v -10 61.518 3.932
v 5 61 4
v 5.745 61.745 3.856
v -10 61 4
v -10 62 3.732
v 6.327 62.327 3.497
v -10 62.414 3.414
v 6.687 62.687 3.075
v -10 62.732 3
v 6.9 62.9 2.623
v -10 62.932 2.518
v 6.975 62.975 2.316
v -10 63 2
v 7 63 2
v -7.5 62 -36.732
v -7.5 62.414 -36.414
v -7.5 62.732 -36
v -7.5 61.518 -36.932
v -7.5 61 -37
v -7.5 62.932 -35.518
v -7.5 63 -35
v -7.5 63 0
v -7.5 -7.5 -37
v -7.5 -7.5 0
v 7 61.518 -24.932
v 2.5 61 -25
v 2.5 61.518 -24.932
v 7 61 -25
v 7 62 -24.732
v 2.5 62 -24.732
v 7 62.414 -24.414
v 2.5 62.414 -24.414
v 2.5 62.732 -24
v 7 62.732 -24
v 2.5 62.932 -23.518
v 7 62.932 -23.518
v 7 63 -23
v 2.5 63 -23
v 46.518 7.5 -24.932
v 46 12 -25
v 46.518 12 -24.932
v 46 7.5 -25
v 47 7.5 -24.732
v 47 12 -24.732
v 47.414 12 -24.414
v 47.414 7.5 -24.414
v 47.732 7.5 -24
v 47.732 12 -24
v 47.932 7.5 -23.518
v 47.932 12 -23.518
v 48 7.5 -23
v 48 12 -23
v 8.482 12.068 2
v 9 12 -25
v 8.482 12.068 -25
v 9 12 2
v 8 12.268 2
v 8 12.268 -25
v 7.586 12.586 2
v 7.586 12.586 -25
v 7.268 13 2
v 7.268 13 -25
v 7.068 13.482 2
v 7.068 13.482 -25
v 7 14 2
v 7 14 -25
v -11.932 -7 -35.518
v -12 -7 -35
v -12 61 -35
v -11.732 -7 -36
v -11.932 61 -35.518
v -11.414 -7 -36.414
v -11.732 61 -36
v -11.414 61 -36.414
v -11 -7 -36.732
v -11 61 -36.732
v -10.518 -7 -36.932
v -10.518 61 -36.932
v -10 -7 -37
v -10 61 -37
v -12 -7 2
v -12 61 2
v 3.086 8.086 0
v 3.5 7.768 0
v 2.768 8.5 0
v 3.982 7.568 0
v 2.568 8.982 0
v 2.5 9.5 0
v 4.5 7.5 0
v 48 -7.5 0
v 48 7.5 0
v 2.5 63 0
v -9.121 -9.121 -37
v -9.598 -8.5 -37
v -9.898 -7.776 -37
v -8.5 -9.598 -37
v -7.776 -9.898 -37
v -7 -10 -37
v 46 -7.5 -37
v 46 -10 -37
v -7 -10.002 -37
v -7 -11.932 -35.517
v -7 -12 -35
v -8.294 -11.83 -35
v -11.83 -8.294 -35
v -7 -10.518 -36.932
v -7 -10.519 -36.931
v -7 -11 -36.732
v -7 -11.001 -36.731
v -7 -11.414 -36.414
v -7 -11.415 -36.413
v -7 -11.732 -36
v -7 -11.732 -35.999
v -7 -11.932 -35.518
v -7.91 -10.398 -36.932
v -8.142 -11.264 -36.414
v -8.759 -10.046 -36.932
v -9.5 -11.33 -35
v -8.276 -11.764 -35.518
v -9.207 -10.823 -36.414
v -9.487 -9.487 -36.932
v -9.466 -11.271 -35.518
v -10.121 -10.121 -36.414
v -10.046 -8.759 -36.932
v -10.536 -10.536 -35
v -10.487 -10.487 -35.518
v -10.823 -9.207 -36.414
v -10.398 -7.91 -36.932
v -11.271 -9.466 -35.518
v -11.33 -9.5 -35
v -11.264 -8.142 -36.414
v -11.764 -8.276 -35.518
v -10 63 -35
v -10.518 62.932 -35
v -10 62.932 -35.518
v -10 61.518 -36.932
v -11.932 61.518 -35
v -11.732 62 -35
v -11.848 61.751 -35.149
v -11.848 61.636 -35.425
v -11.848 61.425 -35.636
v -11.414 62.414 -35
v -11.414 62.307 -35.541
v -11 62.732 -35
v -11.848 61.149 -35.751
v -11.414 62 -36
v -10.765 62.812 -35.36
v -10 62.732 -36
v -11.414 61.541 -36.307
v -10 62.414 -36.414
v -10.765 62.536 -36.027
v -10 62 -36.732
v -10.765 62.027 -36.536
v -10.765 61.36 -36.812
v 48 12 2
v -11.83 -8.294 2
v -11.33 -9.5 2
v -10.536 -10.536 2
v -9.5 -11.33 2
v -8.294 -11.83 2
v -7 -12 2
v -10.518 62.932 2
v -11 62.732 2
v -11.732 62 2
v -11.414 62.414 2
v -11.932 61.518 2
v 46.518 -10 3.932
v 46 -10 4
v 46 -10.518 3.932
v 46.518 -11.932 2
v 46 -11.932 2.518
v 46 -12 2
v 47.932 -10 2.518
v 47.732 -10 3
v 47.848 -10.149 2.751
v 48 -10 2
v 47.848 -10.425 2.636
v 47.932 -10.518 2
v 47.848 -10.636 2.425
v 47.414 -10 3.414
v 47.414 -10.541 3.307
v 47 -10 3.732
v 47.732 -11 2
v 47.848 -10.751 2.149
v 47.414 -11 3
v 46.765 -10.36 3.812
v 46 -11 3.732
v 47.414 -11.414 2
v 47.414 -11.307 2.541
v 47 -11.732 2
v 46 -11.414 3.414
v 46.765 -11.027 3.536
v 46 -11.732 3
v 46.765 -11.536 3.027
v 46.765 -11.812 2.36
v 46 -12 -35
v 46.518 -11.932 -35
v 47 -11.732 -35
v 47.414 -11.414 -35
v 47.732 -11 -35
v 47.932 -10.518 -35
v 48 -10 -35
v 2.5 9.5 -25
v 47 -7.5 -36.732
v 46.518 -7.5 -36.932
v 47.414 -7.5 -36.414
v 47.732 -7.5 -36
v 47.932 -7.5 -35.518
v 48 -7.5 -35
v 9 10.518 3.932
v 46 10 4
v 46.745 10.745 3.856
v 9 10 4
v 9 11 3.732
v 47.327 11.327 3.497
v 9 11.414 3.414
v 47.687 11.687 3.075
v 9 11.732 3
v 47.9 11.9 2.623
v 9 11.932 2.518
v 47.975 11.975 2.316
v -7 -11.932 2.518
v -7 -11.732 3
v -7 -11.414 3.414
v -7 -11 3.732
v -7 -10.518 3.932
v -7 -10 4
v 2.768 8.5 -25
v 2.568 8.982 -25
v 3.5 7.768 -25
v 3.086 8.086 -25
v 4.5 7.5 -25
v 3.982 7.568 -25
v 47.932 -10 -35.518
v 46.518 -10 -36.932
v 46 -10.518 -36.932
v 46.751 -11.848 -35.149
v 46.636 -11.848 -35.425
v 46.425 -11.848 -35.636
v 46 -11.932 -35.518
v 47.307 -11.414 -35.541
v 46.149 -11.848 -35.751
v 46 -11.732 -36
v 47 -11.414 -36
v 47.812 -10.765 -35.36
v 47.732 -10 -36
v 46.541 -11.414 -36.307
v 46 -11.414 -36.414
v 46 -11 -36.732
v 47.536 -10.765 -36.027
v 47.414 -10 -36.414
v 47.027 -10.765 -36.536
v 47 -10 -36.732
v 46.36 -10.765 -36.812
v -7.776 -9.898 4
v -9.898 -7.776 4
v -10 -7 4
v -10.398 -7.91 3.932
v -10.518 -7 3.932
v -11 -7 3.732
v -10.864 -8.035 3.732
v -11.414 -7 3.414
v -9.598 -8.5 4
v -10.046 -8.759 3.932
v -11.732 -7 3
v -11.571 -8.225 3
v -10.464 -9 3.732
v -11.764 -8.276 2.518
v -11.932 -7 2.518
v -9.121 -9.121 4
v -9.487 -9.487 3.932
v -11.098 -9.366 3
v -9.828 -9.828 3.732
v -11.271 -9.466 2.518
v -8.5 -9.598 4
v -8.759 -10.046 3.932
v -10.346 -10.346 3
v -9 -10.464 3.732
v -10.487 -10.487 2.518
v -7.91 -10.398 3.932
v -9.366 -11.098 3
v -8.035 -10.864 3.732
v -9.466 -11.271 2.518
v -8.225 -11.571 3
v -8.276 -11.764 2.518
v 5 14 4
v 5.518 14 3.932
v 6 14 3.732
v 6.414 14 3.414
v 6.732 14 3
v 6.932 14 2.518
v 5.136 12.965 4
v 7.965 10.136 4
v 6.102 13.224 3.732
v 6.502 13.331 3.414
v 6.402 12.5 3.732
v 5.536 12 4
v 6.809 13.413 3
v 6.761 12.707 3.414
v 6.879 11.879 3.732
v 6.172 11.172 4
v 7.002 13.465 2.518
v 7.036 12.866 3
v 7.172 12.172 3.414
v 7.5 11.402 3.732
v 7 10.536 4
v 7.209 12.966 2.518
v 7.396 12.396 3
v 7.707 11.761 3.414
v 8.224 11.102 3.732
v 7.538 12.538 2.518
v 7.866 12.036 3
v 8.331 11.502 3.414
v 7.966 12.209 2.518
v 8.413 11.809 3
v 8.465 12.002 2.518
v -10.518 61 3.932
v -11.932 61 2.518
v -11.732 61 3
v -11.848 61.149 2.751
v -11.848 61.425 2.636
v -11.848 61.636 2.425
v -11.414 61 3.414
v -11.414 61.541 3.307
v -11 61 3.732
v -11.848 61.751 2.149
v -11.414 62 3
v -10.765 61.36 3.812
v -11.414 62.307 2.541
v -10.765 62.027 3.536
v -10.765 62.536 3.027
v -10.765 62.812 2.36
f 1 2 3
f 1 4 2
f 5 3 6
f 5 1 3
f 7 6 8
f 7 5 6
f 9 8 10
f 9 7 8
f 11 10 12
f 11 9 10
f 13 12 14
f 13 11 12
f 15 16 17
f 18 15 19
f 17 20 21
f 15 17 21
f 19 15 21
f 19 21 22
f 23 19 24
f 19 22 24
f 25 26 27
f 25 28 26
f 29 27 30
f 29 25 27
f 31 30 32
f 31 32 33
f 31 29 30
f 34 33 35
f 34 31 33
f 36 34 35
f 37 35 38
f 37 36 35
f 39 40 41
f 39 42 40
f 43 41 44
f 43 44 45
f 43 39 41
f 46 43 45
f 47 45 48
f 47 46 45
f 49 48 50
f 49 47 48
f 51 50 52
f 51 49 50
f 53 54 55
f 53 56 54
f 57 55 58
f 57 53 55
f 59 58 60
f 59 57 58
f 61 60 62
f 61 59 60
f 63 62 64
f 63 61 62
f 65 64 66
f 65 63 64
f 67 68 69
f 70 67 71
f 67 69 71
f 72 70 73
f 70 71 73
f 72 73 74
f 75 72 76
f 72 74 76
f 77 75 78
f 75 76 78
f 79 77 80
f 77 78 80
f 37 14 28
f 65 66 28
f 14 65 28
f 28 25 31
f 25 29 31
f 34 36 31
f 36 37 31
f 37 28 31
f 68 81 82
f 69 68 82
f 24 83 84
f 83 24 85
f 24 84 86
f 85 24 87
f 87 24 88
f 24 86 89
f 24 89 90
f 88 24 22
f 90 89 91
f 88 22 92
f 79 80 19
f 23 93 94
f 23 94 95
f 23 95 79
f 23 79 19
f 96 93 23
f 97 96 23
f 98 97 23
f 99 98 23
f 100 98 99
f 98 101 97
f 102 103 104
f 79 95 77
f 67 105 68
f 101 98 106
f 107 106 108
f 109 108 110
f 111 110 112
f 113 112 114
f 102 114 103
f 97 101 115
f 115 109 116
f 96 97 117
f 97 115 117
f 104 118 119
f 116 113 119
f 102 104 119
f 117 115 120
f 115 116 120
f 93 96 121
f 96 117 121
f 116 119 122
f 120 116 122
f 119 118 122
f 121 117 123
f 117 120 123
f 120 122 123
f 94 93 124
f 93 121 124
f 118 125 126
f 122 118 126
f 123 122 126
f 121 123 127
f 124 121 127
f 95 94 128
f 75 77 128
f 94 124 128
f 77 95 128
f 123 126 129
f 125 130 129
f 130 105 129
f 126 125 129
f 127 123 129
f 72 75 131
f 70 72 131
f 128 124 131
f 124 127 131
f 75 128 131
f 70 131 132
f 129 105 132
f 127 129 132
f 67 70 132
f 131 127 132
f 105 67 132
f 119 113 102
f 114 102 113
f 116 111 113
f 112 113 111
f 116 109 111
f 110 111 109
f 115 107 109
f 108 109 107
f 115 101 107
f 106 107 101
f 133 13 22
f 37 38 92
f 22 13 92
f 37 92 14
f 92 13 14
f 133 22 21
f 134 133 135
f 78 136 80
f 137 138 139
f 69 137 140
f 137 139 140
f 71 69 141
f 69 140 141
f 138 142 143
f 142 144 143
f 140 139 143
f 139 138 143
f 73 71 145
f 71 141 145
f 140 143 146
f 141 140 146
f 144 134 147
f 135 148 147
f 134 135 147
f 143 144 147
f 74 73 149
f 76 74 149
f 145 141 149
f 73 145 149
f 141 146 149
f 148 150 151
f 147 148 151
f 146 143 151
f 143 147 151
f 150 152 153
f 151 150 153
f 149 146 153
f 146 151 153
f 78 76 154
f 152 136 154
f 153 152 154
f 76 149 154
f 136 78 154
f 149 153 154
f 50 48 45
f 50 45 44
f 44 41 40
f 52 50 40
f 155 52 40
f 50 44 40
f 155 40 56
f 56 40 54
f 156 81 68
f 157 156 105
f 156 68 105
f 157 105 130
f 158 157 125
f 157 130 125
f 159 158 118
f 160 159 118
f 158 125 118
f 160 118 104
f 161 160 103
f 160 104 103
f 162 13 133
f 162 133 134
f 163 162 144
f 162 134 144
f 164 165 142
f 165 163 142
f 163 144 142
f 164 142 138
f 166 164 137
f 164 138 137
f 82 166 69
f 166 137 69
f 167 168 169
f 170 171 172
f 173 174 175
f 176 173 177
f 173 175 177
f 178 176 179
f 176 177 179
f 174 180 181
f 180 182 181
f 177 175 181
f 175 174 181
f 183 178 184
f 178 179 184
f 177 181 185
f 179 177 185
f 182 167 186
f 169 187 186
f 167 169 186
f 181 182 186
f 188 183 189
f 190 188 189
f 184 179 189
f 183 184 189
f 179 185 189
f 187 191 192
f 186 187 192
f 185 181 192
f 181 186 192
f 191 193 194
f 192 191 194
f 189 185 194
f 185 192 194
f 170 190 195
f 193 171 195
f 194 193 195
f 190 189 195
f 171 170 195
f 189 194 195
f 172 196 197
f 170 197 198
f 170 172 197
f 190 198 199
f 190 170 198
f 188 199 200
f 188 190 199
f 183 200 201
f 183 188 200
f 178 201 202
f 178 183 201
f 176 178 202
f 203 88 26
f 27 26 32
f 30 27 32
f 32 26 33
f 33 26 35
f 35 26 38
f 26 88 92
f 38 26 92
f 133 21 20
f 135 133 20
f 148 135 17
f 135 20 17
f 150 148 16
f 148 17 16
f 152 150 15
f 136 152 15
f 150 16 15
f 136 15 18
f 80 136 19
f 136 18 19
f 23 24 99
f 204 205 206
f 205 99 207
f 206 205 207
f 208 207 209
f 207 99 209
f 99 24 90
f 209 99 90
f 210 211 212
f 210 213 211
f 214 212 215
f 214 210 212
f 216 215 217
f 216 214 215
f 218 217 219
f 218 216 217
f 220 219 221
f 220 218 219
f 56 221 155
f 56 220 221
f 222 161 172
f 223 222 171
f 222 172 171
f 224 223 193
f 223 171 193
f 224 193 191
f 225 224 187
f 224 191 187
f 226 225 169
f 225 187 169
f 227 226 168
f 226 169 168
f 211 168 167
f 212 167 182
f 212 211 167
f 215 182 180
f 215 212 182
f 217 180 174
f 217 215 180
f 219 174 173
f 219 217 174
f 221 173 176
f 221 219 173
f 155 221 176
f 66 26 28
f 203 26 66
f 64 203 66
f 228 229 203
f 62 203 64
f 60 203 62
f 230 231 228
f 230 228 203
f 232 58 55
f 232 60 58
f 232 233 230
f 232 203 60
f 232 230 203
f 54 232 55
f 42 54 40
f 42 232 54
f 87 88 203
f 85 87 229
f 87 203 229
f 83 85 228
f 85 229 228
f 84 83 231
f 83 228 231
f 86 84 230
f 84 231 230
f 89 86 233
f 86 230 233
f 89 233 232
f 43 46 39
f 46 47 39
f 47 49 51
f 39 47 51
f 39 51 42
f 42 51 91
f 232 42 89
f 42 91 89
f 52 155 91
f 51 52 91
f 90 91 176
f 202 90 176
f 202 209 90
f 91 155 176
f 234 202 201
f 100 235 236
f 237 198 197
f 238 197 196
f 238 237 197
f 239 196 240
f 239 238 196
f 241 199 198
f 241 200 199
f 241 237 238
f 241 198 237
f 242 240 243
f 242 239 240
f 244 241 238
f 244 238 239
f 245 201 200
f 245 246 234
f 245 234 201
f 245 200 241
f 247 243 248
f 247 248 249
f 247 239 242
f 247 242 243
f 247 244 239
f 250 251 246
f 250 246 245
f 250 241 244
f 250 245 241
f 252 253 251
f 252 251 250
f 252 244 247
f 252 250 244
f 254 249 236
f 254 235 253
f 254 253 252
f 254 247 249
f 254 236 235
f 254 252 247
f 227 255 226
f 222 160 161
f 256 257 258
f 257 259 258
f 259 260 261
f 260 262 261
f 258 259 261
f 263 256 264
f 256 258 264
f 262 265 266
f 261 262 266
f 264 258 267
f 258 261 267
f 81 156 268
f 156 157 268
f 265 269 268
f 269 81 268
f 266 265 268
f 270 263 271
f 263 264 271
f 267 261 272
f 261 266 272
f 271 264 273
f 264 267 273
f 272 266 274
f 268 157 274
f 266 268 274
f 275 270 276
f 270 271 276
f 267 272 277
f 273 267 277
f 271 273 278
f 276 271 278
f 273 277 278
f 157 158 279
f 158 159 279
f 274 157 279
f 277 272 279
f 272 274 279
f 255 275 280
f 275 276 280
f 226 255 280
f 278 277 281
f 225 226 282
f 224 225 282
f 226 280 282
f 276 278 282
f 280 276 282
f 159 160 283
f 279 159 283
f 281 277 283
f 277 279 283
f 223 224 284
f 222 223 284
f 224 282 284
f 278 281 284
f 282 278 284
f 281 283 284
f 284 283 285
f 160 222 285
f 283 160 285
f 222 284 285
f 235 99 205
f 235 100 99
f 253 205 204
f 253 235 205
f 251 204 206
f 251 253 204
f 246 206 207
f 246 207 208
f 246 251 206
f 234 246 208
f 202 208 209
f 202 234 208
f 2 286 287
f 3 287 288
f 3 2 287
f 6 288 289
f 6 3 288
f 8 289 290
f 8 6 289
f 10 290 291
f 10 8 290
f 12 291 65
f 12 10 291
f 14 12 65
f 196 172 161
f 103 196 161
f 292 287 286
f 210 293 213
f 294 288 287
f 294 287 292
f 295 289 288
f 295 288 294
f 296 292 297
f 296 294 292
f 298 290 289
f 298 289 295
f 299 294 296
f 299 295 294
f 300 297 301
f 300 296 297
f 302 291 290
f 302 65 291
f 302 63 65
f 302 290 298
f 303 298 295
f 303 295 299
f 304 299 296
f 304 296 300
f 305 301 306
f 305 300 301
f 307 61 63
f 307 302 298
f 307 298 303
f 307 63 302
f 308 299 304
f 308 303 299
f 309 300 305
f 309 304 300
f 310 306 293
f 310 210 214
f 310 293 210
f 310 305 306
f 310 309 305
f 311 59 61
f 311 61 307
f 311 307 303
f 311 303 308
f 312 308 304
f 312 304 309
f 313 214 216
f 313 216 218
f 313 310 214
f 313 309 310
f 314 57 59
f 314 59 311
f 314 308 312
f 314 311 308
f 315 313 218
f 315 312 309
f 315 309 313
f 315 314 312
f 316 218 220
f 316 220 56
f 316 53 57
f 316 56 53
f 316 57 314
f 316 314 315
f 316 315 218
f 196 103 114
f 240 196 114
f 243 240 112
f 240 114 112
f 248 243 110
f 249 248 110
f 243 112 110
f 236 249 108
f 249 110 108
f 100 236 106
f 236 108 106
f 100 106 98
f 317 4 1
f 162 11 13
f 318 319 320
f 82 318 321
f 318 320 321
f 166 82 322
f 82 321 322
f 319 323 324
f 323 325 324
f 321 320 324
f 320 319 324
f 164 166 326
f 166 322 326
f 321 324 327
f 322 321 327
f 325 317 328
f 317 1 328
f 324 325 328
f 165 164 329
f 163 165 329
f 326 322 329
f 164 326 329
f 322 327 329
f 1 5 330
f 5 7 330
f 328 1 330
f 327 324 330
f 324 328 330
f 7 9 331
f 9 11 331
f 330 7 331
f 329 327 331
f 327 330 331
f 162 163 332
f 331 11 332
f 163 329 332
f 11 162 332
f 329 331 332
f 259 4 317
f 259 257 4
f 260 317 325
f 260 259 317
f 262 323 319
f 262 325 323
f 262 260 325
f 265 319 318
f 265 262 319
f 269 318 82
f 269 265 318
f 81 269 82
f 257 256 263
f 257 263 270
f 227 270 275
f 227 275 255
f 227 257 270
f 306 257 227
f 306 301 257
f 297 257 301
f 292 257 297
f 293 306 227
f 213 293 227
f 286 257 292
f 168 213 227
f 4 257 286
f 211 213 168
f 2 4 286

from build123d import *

# Parameters (mm, degrees)
F1_DEPTH    = 4
F3_DEPTH    = 25
F5_DEPTH    = 12
F6_R        = 2
F7_T1_DEPTH = 41
F7_T4_ANGLE = 90
F7_T6_ANGLE = 90


# Not quite as in the source:
# - a fillet or chamfer that OpenCascade refuses, or shapes differently, is made with other operations: its cross-section is extruded or revolved along the edge and cut away or added


with BuildPart() as f1:
    # F0 (on Top) → F1 (new body)
    with BuildSketch(Plane.XY):
        Polygon((7, 12), (7, 63), (-12, 63), (-12, -12), (48, -12), (48, 12), align=None)
    extrude(amount=F1_DEPTH)

    # F2 (on face) → F3 (join)
    with BuildSketch(Plane(origin=(0, 0, 0), x_dir=(1, 0, 0), z_dir=(0, 0, -1))):
        Polygon((48, 12), (-12, 12), (-12, -63), (-7.5, -63), (-7.5, 7.5), (48, 7.5), align=None)
        Polygon((2.5, -63), (7, -63), (7, -12), (48, -12), (48, -7.5), (2.5, -7.5), align=None)
    extrude(amount=F3_DEPTH)

    # F4 (on face) → F5 (join)
    with BuildSketch(Plane(origin=(0, 0, -25), x_dir=(1, 0, 0), z_dir=(0, 0, -1))):
        Polygon((48, 12), (-12, 12), (-12, -63), (-7.5, -63), (-7.5, 7.5), (48, 7.5), align=None)
    extrude(amount=F5_DEPTH)

    # F6
    f6_edges = [f1.edges().sort_by_distance(p)[0] for p in [
        (7, 37.5, 4),
        (-2.5, 63, 4),
        (-12, 25.5, 4),
        (18, -12, 4),
        (48, 0, 4),
        (27.5, 12, 4),
        (-9.75, 63, -37),
        (4.75, 63, -25),
        (48, -9.75, -37),
        (48, 9.75, -25),
        (2.5, 7.5, -12.5),
        (7, 12, -10.5),
        (-12, 63, -16.5),
        (48, -12, -16.5),
        (-12, 25.5, -37),
        (18, -12, -37),
    ]]
    fillet(f6_edges, radius=F6_R)

    # F7: fillet of radius 5 on 1 edges, made by hand

    # F7_s2 → F7_t1 (cut)
    with BuildSketch(Plane.XY.offset(-37)):
        with BuildLine():
            ThreePointArc((-12, -7), (-10.5355339059, -10.5355339059), (-7, -12))
            Line((-7, -12), (-12, -12))
            Line((-12, -12), (-12, -7))
        make_face()
    extrude(amount=F7_T1_DEPTH, mode=Mode.SUBTRACT)

    # F7_s3 → F7_t4 (revolve, cut)
    with BuildSketch(Plane.YZ.offset(-7)):
        with BuildLine():
            ThreePointArc((-10, -37), (-11.4142135624, -36.4142135624), (-12, -35))
            Line((-12, -35), (-12, -37))
            Line((-12, -37), (-10, -37))
        make_face()
    revolve(axis=Axis((-7, -7, -37), (0, 0, -1)), revolution_arc=F7_T4_ANGLE, mode=Mode.SUBTRACT)

    # F7_s5 → F7_t6 (revolve, cut)
    with BuildSketch(Plane.XZ.offset(7)):
        with BuildLine():
            ThreePointArc((-10, 4), (-11.4142135624, 3.4142135624), (-12, 2))
            Line((-12, 2), (-12, 4))
            Line((-12, 4), (-10, 4))
        make_face()
    revolve(axis=Axis((-7, -7, 4), (0, 0, 1)), revolution_arc=F7_T6_ANGLE, mode=Mode.SUBTRACT)


solid = f1.part
